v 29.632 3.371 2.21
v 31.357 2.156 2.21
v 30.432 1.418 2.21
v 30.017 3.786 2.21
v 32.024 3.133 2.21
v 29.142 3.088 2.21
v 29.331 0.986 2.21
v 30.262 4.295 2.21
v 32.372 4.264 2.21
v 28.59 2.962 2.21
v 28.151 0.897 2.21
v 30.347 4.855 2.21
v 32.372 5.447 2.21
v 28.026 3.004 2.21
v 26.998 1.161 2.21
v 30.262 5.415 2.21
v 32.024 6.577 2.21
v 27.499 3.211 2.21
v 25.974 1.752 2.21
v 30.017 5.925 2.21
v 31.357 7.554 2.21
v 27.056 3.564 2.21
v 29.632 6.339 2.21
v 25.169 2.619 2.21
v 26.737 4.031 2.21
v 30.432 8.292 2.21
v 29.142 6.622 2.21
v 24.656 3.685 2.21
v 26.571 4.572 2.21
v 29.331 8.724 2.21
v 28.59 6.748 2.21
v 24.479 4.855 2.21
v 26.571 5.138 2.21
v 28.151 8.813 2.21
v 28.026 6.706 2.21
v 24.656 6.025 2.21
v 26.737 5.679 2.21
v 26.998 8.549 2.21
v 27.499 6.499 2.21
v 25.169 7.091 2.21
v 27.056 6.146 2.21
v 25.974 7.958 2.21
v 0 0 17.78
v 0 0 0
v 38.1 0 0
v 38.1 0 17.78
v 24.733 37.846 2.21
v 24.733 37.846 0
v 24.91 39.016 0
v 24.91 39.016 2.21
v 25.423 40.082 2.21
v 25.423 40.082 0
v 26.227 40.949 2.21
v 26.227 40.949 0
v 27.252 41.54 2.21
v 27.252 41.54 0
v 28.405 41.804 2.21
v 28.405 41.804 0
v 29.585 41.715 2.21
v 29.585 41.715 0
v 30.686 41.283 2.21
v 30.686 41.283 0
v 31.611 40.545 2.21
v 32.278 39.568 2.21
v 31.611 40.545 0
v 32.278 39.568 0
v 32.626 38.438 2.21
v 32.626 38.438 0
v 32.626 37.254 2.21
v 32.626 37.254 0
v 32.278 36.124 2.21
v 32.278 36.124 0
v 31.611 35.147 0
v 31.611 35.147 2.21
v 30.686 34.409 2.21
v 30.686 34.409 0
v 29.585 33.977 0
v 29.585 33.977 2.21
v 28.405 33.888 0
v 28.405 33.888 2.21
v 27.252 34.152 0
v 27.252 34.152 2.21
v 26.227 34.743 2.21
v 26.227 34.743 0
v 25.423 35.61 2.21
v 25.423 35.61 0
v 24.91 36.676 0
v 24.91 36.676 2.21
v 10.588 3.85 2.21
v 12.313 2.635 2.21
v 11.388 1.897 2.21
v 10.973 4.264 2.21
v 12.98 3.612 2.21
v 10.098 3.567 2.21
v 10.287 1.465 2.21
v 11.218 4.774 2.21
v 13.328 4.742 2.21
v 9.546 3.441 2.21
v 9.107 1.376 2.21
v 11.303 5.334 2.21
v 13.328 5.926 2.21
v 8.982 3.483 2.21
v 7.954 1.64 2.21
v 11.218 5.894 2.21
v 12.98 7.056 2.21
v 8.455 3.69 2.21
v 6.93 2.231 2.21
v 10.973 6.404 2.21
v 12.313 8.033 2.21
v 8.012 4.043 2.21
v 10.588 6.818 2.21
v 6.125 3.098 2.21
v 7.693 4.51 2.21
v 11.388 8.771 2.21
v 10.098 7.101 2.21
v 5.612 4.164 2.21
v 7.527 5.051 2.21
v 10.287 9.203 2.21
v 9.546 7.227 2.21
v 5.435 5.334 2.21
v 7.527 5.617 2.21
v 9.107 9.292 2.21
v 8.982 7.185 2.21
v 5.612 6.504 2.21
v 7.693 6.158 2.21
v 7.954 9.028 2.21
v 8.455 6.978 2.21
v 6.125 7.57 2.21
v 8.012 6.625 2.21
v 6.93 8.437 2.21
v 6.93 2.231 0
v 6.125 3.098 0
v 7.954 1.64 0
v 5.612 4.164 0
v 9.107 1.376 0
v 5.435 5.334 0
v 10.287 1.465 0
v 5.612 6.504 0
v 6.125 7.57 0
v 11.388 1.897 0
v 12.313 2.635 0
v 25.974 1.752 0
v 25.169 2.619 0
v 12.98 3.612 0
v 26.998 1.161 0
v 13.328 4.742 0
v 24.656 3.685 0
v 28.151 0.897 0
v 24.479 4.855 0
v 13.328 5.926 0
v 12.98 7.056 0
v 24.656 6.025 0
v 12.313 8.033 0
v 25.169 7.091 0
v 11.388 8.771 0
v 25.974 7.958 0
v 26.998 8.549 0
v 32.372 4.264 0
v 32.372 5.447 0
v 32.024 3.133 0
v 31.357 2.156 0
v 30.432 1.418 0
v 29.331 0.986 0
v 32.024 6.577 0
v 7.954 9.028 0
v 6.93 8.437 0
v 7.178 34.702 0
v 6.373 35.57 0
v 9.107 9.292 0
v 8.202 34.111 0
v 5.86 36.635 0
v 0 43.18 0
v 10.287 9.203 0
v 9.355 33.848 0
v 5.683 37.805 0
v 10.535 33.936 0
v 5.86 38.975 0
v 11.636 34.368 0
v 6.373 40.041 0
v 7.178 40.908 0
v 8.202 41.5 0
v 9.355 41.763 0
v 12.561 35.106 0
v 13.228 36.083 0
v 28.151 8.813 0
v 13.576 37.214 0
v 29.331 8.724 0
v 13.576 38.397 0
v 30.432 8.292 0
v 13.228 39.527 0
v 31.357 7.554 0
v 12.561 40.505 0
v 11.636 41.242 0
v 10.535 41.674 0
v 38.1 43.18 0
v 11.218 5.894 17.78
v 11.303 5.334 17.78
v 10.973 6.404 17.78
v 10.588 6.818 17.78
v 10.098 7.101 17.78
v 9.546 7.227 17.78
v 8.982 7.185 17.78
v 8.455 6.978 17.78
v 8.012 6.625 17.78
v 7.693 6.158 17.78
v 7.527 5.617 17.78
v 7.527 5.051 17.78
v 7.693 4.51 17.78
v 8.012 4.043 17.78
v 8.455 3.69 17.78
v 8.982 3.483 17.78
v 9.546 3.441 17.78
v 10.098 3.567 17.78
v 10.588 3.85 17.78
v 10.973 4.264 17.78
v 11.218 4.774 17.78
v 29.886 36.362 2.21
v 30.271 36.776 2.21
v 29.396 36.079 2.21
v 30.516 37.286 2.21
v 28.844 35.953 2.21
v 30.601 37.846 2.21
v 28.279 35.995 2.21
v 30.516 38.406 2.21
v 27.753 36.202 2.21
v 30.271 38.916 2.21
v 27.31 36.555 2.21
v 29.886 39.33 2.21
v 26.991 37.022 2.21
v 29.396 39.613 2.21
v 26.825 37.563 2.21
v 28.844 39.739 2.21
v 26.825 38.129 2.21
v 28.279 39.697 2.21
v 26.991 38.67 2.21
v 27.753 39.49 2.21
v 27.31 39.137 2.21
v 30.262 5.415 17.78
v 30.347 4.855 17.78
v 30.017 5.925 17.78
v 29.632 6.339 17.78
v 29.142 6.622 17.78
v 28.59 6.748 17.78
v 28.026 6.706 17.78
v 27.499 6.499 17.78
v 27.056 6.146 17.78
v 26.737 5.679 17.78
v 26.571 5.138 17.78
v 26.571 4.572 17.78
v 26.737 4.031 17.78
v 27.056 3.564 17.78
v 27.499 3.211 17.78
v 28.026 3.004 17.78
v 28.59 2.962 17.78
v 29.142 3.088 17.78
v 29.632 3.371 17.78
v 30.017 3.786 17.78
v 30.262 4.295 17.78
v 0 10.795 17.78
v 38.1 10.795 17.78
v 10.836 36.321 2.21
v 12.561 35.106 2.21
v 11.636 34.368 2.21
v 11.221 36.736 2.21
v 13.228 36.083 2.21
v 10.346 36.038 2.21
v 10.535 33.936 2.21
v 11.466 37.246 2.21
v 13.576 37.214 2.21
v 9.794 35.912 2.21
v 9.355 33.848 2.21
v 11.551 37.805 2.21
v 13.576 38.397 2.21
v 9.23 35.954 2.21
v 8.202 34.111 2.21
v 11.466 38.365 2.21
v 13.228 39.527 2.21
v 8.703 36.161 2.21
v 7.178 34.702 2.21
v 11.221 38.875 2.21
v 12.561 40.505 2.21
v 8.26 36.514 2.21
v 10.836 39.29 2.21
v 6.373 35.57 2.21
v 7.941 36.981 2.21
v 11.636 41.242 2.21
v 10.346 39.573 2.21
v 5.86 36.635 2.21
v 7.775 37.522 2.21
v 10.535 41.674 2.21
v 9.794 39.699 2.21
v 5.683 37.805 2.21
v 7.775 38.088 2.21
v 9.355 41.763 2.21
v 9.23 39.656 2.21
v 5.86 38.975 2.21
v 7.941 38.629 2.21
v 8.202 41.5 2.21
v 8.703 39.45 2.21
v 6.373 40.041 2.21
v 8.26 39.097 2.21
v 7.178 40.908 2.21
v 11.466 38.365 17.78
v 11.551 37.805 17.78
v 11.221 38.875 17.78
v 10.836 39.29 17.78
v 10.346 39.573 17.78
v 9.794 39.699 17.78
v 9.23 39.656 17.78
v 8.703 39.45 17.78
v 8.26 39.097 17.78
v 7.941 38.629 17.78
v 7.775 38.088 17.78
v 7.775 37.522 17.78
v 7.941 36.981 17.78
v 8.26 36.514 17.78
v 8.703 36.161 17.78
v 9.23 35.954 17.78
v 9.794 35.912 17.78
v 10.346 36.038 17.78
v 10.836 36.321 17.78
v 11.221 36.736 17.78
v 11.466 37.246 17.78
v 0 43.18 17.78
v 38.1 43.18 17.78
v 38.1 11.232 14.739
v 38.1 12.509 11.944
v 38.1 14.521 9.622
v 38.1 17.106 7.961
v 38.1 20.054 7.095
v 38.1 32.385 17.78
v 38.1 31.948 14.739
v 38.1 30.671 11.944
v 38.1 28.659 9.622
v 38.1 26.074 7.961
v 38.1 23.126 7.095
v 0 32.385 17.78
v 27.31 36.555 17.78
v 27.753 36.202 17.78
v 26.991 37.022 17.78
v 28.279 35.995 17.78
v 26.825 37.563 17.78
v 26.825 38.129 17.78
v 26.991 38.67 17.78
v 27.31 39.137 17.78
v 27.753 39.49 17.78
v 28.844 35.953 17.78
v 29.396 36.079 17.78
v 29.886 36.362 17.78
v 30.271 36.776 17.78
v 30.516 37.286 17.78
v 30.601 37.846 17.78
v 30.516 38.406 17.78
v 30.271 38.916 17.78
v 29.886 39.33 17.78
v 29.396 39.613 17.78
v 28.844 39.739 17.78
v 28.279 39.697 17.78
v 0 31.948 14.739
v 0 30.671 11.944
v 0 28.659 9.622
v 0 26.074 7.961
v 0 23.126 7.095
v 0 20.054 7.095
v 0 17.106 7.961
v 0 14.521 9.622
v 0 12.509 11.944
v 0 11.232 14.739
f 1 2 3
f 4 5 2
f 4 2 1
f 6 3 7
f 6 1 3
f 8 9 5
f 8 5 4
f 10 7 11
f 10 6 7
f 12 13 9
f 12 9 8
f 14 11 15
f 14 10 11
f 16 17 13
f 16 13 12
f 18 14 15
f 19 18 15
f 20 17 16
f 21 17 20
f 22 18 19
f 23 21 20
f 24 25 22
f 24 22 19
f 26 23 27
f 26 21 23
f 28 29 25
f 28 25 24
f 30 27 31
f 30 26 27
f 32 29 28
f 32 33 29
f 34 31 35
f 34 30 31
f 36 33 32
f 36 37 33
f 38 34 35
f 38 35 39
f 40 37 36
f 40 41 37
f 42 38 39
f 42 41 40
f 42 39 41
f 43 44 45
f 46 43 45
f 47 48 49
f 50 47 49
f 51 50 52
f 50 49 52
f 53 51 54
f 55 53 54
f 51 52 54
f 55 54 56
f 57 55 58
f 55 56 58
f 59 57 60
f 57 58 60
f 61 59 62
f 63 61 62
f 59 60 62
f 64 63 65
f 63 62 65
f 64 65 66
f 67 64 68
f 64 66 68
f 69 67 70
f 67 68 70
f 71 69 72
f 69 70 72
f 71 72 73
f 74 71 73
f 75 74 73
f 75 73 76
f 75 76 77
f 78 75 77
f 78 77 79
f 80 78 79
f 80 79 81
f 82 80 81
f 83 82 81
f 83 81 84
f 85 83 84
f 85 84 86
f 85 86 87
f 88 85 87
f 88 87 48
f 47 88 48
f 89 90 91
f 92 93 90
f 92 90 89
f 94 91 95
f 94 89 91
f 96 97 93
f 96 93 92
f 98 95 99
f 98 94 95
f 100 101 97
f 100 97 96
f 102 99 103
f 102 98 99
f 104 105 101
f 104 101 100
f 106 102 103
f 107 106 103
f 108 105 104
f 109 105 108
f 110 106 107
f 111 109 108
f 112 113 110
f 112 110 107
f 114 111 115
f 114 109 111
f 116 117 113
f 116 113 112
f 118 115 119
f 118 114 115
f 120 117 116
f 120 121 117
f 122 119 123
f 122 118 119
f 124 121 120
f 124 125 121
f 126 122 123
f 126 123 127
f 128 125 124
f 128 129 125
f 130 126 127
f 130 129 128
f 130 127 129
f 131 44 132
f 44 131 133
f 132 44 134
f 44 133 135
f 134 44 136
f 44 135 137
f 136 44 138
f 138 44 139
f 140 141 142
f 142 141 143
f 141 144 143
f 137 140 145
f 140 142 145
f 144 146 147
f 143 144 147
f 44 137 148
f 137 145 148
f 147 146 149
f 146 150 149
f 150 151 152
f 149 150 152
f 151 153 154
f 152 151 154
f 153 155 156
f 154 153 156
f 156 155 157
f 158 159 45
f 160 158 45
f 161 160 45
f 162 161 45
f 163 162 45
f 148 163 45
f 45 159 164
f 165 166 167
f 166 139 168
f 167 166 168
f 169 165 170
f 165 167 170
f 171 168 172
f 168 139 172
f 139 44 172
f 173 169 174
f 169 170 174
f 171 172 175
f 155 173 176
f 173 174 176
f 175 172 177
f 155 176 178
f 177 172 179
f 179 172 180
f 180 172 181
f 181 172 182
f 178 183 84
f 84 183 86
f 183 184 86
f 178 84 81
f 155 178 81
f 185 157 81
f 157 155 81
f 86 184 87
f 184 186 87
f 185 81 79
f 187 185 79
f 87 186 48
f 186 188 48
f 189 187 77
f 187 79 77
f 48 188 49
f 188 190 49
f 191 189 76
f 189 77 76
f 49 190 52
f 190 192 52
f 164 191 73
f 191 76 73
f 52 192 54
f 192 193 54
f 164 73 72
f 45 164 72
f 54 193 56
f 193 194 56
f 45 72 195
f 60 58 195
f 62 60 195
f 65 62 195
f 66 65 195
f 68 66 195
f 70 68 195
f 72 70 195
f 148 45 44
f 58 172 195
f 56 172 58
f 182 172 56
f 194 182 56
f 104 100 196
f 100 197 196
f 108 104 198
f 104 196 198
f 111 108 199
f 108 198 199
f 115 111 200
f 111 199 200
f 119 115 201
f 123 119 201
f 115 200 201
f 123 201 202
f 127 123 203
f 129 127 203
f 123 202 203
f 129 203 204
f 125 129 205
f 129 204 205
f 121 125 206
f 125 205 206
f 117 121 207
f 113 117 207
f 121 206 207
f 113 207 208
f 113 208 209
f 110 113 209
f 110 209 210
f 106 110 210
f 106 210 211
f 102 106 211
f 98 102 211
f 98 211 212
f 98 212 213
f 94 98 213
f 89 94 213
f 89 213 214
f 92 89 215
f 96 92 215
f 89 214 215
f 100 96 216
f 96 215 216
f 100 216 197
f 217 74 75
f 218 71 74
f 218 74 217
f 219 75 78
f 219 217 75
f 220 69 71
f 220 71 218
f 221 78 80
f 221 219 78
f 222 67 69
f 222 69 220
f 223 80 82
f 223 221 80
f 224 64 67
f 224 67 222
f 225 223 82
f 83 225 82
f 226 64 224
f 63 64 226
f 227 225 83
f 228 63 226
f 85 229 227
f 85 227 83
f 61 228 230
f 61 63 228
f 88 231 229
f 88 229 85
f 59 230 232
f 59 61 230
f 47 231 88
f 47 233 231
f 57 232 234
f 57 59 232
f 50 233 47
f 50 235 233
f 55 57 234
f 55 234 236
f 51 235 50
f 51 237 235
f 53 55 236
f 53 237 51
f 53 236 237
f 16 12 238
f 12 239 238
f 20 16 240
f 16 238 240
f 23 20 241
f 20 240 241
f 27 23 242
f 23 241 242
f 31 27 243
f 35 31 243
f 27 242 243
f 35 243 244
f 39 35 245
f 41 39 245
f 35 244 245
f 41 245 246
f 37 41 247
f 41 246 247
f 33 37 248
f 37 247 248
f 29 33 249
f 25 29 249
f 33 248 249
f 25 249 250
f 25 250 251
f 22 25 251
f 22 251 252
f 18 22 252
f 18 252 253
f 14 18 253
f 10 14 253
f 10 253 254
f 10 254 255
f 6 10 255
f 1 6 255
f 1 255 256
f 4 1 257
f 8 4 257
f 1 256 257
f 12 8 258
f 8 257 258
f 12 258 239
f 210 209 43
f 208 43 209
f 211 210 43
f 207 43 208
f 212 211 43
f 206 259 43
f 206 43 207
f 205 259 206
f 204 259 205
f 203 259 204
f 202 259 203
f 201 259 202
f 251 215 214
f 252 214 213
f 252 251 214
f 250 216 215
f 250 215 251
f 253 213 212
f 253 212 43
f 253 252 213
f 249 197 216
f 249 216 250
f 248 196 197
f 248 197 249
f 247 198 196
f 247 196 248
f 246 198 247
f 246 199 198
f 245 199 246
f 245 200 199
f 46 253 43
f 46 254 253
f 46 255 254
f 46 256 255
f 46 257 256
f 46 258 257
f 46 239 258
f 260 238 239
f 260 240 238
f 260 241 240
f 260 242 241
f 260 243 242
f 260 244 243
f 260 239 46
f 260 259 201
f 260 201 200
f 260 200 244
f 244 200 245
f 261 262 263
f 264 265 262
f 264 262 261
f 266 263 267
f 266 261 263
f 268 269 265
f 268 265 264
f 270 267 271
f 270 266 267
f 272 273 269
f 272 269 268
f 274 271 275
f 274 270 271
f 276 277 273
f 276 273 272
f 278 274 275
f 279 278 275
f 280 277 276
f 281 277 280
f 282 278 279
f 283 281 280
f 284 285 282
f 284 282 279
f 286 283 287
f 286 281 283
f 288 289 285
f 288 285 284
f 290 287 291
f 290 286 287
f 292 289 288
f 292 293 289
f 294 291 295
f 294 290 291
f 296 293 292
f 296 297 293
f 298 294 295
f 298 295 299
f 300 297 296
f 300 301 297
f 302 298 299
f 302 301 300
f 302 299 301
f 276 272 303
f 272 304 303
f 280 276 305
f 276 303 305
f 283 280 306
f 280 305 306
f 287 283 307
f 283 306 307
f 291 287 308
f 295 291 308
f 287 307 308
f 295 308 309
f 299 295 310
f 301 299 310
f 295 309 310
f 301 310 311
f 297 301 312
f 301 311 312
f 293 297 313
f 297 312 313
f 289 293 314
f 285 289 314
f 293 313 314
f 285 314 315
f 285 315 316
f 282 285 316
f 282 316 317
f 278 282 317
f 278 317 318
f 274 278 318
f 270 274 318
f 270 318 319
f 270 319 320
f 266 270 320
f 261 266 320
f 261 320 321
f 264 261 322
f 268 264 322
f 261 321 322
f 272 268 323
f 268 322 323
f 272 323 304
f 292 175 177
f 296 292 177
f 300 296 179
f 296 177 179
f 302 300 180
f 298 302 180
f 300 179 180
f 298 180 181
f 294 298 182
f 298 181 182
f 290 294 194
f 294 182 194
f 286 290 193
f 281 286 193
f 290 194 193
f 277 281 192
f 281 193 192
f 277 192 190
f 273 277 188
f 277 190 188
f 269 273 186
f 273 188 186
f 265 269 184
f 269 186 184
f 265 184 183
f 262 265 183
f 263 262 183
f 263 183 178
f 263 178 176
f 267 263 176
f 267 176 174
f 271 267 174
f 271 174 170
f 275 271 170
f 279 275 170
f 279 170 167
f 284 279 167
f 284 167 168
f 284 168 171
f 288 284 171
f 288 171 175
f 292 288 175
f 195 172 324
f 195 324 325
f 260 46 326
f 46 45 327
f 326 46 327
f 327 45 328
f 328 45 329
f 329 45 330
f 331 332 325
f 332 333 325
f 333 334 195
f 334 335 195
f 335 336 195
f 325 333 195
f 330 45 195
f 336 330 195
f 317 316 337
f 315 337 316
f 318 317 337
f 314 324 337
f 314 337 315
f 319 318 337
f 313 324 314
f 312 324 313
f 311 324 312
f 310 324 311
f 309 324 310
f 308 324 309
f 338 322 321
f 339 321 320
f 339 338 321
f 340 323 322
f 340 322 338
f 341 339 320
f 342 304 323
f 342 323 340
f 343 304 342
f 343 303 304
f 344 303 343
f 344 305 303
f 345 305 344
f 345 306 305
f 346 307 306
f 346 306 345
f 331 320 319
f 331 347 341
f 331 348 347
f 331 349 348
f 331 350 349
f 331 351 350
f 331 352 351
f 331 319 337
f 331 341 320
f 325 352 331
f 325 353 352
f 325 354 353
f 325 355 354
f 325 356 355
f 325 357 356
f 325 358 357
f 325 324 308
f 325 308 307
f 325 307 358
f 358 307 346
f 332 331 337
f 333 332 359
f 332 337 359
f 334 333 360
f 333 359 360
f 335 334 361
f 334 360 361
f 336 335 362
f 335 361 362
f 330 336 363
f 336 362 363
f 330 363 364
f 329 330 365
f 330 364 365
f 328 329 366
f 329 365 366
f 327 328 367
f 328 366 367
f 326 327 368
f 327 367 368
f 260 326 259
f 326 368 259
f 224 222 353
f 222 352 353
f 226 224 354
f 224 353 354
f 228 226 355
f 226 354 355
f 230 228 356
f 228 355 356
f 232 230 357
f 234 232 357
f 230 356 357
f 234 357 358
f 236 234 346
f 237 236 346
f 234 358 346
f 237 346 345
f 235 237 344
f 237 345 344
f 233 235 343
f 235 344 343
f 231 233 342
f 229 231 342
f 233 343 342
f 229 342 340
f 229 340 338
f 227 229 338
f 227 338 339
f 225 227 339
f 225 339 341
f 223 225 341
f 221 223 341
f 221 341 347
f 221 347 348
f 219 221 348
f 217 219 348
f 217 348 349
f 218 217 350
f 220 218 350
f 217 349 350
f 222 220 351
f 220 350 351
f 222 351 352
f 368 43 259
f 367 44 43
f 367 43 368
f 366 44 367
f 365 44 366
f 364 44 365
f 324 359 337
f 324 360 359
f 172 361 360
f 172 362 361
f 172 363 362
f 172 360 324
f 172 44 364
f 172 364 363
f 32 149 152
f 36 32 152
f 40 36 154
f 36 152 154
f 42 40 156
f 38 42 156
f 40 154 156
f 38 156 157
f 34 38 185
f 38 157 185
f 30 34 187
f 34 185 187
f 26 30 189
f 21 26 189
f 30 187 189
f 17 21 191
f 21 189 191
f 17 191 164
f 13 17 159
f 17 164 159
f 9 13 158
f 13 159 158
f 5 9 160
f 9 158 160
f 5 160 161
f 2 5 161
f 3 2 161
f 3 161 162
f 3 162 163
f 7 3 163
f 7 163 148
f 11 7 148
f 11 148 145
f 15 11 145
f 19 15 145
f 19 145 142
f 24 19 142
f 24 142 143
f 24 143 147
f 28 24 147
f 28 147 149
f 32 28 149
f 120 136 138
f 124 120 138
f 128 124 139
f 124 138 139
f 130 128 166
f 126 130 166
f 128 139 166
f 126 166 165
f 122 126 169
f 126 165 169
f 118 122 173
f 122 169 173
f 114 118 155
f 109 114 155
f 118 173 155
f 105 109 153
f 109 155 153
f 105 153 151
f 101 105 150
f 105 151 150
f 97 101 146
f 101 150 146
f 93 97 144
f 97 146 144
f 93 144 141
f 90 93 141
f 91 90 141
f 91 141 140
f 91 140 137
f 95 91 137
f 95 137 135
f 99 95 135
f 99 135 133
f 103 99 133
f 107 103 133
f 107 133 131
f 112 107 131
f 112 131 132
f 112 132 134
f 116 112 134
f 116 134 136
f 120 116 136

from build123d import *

# Parameters (mm, degrees)
SKETCH1_W                                           = 38.1
SKETCH1_H                                           = 43.18
BOSS_EXTRUDE1_DEPTH                                 = 17.78
SKETCH2_R                                           = 10.795
CUT_EXTRUDE1_DEPTH                                  = 61.26815743
CBORE_FOR_6_BINDING_HEAD_MACHINE_SCREW1_D           = 3.7973
CBORE_FOR_6_BINDING_HEAD_MACHINE_SCREW1_CBORE_D     = 7.9375
CBORE_FOR_6_BINDING_HEAD_MACHINE_SCREW1_CBORE_DEPTH = 2.2098


with BuildPart() as part:
    # Sketch1 → Boss-Extrude1 (new body)
    with BuildSketch(Plane.XY):
        with Locations((19.05, 21.59)):
            Rectangle(SKETCH1_W, SKETCH1_H)
    extrude(amount=BOSS_EXTRUDE1_DEPTH)

    # Sketch2 → Cut-Extrude1 (cut, through all)
    with BuildSketch(Plane.ZY):
        with Locations((17.78, 21.59)):
            Circle(SKETCH2_R)
    extrude(amount=-CUT_EXTRUDE1_DEPTH, mode=Mode.SUBTRACT)

    # CBORE for #6 Binding Head Machine Screw1 (through all)
    with Locations(Plane(origin=(28.701956409, 37.846, 0), x_dir=(-1, 0, 0), z_dir=(0, 0, -1))):
        with Locations((0, 0), (19.049956409, -0.040753052), (0.253956409, -32.99093936), (19.297934909, -32.512)):
            CounterBoreHole(CBORE_FOR_6_BINDING_HEAD_MACHINE_SCREW1_D / 2, CBORE_FOR_6_BINDING_HEAD_MACHINE_SCREW1_CBORE_D / 2, CBORE_FOR_6_BINDING_HEAD_MACHINE_SCREW1_CBORE_DEPTH)


solid = part.part
